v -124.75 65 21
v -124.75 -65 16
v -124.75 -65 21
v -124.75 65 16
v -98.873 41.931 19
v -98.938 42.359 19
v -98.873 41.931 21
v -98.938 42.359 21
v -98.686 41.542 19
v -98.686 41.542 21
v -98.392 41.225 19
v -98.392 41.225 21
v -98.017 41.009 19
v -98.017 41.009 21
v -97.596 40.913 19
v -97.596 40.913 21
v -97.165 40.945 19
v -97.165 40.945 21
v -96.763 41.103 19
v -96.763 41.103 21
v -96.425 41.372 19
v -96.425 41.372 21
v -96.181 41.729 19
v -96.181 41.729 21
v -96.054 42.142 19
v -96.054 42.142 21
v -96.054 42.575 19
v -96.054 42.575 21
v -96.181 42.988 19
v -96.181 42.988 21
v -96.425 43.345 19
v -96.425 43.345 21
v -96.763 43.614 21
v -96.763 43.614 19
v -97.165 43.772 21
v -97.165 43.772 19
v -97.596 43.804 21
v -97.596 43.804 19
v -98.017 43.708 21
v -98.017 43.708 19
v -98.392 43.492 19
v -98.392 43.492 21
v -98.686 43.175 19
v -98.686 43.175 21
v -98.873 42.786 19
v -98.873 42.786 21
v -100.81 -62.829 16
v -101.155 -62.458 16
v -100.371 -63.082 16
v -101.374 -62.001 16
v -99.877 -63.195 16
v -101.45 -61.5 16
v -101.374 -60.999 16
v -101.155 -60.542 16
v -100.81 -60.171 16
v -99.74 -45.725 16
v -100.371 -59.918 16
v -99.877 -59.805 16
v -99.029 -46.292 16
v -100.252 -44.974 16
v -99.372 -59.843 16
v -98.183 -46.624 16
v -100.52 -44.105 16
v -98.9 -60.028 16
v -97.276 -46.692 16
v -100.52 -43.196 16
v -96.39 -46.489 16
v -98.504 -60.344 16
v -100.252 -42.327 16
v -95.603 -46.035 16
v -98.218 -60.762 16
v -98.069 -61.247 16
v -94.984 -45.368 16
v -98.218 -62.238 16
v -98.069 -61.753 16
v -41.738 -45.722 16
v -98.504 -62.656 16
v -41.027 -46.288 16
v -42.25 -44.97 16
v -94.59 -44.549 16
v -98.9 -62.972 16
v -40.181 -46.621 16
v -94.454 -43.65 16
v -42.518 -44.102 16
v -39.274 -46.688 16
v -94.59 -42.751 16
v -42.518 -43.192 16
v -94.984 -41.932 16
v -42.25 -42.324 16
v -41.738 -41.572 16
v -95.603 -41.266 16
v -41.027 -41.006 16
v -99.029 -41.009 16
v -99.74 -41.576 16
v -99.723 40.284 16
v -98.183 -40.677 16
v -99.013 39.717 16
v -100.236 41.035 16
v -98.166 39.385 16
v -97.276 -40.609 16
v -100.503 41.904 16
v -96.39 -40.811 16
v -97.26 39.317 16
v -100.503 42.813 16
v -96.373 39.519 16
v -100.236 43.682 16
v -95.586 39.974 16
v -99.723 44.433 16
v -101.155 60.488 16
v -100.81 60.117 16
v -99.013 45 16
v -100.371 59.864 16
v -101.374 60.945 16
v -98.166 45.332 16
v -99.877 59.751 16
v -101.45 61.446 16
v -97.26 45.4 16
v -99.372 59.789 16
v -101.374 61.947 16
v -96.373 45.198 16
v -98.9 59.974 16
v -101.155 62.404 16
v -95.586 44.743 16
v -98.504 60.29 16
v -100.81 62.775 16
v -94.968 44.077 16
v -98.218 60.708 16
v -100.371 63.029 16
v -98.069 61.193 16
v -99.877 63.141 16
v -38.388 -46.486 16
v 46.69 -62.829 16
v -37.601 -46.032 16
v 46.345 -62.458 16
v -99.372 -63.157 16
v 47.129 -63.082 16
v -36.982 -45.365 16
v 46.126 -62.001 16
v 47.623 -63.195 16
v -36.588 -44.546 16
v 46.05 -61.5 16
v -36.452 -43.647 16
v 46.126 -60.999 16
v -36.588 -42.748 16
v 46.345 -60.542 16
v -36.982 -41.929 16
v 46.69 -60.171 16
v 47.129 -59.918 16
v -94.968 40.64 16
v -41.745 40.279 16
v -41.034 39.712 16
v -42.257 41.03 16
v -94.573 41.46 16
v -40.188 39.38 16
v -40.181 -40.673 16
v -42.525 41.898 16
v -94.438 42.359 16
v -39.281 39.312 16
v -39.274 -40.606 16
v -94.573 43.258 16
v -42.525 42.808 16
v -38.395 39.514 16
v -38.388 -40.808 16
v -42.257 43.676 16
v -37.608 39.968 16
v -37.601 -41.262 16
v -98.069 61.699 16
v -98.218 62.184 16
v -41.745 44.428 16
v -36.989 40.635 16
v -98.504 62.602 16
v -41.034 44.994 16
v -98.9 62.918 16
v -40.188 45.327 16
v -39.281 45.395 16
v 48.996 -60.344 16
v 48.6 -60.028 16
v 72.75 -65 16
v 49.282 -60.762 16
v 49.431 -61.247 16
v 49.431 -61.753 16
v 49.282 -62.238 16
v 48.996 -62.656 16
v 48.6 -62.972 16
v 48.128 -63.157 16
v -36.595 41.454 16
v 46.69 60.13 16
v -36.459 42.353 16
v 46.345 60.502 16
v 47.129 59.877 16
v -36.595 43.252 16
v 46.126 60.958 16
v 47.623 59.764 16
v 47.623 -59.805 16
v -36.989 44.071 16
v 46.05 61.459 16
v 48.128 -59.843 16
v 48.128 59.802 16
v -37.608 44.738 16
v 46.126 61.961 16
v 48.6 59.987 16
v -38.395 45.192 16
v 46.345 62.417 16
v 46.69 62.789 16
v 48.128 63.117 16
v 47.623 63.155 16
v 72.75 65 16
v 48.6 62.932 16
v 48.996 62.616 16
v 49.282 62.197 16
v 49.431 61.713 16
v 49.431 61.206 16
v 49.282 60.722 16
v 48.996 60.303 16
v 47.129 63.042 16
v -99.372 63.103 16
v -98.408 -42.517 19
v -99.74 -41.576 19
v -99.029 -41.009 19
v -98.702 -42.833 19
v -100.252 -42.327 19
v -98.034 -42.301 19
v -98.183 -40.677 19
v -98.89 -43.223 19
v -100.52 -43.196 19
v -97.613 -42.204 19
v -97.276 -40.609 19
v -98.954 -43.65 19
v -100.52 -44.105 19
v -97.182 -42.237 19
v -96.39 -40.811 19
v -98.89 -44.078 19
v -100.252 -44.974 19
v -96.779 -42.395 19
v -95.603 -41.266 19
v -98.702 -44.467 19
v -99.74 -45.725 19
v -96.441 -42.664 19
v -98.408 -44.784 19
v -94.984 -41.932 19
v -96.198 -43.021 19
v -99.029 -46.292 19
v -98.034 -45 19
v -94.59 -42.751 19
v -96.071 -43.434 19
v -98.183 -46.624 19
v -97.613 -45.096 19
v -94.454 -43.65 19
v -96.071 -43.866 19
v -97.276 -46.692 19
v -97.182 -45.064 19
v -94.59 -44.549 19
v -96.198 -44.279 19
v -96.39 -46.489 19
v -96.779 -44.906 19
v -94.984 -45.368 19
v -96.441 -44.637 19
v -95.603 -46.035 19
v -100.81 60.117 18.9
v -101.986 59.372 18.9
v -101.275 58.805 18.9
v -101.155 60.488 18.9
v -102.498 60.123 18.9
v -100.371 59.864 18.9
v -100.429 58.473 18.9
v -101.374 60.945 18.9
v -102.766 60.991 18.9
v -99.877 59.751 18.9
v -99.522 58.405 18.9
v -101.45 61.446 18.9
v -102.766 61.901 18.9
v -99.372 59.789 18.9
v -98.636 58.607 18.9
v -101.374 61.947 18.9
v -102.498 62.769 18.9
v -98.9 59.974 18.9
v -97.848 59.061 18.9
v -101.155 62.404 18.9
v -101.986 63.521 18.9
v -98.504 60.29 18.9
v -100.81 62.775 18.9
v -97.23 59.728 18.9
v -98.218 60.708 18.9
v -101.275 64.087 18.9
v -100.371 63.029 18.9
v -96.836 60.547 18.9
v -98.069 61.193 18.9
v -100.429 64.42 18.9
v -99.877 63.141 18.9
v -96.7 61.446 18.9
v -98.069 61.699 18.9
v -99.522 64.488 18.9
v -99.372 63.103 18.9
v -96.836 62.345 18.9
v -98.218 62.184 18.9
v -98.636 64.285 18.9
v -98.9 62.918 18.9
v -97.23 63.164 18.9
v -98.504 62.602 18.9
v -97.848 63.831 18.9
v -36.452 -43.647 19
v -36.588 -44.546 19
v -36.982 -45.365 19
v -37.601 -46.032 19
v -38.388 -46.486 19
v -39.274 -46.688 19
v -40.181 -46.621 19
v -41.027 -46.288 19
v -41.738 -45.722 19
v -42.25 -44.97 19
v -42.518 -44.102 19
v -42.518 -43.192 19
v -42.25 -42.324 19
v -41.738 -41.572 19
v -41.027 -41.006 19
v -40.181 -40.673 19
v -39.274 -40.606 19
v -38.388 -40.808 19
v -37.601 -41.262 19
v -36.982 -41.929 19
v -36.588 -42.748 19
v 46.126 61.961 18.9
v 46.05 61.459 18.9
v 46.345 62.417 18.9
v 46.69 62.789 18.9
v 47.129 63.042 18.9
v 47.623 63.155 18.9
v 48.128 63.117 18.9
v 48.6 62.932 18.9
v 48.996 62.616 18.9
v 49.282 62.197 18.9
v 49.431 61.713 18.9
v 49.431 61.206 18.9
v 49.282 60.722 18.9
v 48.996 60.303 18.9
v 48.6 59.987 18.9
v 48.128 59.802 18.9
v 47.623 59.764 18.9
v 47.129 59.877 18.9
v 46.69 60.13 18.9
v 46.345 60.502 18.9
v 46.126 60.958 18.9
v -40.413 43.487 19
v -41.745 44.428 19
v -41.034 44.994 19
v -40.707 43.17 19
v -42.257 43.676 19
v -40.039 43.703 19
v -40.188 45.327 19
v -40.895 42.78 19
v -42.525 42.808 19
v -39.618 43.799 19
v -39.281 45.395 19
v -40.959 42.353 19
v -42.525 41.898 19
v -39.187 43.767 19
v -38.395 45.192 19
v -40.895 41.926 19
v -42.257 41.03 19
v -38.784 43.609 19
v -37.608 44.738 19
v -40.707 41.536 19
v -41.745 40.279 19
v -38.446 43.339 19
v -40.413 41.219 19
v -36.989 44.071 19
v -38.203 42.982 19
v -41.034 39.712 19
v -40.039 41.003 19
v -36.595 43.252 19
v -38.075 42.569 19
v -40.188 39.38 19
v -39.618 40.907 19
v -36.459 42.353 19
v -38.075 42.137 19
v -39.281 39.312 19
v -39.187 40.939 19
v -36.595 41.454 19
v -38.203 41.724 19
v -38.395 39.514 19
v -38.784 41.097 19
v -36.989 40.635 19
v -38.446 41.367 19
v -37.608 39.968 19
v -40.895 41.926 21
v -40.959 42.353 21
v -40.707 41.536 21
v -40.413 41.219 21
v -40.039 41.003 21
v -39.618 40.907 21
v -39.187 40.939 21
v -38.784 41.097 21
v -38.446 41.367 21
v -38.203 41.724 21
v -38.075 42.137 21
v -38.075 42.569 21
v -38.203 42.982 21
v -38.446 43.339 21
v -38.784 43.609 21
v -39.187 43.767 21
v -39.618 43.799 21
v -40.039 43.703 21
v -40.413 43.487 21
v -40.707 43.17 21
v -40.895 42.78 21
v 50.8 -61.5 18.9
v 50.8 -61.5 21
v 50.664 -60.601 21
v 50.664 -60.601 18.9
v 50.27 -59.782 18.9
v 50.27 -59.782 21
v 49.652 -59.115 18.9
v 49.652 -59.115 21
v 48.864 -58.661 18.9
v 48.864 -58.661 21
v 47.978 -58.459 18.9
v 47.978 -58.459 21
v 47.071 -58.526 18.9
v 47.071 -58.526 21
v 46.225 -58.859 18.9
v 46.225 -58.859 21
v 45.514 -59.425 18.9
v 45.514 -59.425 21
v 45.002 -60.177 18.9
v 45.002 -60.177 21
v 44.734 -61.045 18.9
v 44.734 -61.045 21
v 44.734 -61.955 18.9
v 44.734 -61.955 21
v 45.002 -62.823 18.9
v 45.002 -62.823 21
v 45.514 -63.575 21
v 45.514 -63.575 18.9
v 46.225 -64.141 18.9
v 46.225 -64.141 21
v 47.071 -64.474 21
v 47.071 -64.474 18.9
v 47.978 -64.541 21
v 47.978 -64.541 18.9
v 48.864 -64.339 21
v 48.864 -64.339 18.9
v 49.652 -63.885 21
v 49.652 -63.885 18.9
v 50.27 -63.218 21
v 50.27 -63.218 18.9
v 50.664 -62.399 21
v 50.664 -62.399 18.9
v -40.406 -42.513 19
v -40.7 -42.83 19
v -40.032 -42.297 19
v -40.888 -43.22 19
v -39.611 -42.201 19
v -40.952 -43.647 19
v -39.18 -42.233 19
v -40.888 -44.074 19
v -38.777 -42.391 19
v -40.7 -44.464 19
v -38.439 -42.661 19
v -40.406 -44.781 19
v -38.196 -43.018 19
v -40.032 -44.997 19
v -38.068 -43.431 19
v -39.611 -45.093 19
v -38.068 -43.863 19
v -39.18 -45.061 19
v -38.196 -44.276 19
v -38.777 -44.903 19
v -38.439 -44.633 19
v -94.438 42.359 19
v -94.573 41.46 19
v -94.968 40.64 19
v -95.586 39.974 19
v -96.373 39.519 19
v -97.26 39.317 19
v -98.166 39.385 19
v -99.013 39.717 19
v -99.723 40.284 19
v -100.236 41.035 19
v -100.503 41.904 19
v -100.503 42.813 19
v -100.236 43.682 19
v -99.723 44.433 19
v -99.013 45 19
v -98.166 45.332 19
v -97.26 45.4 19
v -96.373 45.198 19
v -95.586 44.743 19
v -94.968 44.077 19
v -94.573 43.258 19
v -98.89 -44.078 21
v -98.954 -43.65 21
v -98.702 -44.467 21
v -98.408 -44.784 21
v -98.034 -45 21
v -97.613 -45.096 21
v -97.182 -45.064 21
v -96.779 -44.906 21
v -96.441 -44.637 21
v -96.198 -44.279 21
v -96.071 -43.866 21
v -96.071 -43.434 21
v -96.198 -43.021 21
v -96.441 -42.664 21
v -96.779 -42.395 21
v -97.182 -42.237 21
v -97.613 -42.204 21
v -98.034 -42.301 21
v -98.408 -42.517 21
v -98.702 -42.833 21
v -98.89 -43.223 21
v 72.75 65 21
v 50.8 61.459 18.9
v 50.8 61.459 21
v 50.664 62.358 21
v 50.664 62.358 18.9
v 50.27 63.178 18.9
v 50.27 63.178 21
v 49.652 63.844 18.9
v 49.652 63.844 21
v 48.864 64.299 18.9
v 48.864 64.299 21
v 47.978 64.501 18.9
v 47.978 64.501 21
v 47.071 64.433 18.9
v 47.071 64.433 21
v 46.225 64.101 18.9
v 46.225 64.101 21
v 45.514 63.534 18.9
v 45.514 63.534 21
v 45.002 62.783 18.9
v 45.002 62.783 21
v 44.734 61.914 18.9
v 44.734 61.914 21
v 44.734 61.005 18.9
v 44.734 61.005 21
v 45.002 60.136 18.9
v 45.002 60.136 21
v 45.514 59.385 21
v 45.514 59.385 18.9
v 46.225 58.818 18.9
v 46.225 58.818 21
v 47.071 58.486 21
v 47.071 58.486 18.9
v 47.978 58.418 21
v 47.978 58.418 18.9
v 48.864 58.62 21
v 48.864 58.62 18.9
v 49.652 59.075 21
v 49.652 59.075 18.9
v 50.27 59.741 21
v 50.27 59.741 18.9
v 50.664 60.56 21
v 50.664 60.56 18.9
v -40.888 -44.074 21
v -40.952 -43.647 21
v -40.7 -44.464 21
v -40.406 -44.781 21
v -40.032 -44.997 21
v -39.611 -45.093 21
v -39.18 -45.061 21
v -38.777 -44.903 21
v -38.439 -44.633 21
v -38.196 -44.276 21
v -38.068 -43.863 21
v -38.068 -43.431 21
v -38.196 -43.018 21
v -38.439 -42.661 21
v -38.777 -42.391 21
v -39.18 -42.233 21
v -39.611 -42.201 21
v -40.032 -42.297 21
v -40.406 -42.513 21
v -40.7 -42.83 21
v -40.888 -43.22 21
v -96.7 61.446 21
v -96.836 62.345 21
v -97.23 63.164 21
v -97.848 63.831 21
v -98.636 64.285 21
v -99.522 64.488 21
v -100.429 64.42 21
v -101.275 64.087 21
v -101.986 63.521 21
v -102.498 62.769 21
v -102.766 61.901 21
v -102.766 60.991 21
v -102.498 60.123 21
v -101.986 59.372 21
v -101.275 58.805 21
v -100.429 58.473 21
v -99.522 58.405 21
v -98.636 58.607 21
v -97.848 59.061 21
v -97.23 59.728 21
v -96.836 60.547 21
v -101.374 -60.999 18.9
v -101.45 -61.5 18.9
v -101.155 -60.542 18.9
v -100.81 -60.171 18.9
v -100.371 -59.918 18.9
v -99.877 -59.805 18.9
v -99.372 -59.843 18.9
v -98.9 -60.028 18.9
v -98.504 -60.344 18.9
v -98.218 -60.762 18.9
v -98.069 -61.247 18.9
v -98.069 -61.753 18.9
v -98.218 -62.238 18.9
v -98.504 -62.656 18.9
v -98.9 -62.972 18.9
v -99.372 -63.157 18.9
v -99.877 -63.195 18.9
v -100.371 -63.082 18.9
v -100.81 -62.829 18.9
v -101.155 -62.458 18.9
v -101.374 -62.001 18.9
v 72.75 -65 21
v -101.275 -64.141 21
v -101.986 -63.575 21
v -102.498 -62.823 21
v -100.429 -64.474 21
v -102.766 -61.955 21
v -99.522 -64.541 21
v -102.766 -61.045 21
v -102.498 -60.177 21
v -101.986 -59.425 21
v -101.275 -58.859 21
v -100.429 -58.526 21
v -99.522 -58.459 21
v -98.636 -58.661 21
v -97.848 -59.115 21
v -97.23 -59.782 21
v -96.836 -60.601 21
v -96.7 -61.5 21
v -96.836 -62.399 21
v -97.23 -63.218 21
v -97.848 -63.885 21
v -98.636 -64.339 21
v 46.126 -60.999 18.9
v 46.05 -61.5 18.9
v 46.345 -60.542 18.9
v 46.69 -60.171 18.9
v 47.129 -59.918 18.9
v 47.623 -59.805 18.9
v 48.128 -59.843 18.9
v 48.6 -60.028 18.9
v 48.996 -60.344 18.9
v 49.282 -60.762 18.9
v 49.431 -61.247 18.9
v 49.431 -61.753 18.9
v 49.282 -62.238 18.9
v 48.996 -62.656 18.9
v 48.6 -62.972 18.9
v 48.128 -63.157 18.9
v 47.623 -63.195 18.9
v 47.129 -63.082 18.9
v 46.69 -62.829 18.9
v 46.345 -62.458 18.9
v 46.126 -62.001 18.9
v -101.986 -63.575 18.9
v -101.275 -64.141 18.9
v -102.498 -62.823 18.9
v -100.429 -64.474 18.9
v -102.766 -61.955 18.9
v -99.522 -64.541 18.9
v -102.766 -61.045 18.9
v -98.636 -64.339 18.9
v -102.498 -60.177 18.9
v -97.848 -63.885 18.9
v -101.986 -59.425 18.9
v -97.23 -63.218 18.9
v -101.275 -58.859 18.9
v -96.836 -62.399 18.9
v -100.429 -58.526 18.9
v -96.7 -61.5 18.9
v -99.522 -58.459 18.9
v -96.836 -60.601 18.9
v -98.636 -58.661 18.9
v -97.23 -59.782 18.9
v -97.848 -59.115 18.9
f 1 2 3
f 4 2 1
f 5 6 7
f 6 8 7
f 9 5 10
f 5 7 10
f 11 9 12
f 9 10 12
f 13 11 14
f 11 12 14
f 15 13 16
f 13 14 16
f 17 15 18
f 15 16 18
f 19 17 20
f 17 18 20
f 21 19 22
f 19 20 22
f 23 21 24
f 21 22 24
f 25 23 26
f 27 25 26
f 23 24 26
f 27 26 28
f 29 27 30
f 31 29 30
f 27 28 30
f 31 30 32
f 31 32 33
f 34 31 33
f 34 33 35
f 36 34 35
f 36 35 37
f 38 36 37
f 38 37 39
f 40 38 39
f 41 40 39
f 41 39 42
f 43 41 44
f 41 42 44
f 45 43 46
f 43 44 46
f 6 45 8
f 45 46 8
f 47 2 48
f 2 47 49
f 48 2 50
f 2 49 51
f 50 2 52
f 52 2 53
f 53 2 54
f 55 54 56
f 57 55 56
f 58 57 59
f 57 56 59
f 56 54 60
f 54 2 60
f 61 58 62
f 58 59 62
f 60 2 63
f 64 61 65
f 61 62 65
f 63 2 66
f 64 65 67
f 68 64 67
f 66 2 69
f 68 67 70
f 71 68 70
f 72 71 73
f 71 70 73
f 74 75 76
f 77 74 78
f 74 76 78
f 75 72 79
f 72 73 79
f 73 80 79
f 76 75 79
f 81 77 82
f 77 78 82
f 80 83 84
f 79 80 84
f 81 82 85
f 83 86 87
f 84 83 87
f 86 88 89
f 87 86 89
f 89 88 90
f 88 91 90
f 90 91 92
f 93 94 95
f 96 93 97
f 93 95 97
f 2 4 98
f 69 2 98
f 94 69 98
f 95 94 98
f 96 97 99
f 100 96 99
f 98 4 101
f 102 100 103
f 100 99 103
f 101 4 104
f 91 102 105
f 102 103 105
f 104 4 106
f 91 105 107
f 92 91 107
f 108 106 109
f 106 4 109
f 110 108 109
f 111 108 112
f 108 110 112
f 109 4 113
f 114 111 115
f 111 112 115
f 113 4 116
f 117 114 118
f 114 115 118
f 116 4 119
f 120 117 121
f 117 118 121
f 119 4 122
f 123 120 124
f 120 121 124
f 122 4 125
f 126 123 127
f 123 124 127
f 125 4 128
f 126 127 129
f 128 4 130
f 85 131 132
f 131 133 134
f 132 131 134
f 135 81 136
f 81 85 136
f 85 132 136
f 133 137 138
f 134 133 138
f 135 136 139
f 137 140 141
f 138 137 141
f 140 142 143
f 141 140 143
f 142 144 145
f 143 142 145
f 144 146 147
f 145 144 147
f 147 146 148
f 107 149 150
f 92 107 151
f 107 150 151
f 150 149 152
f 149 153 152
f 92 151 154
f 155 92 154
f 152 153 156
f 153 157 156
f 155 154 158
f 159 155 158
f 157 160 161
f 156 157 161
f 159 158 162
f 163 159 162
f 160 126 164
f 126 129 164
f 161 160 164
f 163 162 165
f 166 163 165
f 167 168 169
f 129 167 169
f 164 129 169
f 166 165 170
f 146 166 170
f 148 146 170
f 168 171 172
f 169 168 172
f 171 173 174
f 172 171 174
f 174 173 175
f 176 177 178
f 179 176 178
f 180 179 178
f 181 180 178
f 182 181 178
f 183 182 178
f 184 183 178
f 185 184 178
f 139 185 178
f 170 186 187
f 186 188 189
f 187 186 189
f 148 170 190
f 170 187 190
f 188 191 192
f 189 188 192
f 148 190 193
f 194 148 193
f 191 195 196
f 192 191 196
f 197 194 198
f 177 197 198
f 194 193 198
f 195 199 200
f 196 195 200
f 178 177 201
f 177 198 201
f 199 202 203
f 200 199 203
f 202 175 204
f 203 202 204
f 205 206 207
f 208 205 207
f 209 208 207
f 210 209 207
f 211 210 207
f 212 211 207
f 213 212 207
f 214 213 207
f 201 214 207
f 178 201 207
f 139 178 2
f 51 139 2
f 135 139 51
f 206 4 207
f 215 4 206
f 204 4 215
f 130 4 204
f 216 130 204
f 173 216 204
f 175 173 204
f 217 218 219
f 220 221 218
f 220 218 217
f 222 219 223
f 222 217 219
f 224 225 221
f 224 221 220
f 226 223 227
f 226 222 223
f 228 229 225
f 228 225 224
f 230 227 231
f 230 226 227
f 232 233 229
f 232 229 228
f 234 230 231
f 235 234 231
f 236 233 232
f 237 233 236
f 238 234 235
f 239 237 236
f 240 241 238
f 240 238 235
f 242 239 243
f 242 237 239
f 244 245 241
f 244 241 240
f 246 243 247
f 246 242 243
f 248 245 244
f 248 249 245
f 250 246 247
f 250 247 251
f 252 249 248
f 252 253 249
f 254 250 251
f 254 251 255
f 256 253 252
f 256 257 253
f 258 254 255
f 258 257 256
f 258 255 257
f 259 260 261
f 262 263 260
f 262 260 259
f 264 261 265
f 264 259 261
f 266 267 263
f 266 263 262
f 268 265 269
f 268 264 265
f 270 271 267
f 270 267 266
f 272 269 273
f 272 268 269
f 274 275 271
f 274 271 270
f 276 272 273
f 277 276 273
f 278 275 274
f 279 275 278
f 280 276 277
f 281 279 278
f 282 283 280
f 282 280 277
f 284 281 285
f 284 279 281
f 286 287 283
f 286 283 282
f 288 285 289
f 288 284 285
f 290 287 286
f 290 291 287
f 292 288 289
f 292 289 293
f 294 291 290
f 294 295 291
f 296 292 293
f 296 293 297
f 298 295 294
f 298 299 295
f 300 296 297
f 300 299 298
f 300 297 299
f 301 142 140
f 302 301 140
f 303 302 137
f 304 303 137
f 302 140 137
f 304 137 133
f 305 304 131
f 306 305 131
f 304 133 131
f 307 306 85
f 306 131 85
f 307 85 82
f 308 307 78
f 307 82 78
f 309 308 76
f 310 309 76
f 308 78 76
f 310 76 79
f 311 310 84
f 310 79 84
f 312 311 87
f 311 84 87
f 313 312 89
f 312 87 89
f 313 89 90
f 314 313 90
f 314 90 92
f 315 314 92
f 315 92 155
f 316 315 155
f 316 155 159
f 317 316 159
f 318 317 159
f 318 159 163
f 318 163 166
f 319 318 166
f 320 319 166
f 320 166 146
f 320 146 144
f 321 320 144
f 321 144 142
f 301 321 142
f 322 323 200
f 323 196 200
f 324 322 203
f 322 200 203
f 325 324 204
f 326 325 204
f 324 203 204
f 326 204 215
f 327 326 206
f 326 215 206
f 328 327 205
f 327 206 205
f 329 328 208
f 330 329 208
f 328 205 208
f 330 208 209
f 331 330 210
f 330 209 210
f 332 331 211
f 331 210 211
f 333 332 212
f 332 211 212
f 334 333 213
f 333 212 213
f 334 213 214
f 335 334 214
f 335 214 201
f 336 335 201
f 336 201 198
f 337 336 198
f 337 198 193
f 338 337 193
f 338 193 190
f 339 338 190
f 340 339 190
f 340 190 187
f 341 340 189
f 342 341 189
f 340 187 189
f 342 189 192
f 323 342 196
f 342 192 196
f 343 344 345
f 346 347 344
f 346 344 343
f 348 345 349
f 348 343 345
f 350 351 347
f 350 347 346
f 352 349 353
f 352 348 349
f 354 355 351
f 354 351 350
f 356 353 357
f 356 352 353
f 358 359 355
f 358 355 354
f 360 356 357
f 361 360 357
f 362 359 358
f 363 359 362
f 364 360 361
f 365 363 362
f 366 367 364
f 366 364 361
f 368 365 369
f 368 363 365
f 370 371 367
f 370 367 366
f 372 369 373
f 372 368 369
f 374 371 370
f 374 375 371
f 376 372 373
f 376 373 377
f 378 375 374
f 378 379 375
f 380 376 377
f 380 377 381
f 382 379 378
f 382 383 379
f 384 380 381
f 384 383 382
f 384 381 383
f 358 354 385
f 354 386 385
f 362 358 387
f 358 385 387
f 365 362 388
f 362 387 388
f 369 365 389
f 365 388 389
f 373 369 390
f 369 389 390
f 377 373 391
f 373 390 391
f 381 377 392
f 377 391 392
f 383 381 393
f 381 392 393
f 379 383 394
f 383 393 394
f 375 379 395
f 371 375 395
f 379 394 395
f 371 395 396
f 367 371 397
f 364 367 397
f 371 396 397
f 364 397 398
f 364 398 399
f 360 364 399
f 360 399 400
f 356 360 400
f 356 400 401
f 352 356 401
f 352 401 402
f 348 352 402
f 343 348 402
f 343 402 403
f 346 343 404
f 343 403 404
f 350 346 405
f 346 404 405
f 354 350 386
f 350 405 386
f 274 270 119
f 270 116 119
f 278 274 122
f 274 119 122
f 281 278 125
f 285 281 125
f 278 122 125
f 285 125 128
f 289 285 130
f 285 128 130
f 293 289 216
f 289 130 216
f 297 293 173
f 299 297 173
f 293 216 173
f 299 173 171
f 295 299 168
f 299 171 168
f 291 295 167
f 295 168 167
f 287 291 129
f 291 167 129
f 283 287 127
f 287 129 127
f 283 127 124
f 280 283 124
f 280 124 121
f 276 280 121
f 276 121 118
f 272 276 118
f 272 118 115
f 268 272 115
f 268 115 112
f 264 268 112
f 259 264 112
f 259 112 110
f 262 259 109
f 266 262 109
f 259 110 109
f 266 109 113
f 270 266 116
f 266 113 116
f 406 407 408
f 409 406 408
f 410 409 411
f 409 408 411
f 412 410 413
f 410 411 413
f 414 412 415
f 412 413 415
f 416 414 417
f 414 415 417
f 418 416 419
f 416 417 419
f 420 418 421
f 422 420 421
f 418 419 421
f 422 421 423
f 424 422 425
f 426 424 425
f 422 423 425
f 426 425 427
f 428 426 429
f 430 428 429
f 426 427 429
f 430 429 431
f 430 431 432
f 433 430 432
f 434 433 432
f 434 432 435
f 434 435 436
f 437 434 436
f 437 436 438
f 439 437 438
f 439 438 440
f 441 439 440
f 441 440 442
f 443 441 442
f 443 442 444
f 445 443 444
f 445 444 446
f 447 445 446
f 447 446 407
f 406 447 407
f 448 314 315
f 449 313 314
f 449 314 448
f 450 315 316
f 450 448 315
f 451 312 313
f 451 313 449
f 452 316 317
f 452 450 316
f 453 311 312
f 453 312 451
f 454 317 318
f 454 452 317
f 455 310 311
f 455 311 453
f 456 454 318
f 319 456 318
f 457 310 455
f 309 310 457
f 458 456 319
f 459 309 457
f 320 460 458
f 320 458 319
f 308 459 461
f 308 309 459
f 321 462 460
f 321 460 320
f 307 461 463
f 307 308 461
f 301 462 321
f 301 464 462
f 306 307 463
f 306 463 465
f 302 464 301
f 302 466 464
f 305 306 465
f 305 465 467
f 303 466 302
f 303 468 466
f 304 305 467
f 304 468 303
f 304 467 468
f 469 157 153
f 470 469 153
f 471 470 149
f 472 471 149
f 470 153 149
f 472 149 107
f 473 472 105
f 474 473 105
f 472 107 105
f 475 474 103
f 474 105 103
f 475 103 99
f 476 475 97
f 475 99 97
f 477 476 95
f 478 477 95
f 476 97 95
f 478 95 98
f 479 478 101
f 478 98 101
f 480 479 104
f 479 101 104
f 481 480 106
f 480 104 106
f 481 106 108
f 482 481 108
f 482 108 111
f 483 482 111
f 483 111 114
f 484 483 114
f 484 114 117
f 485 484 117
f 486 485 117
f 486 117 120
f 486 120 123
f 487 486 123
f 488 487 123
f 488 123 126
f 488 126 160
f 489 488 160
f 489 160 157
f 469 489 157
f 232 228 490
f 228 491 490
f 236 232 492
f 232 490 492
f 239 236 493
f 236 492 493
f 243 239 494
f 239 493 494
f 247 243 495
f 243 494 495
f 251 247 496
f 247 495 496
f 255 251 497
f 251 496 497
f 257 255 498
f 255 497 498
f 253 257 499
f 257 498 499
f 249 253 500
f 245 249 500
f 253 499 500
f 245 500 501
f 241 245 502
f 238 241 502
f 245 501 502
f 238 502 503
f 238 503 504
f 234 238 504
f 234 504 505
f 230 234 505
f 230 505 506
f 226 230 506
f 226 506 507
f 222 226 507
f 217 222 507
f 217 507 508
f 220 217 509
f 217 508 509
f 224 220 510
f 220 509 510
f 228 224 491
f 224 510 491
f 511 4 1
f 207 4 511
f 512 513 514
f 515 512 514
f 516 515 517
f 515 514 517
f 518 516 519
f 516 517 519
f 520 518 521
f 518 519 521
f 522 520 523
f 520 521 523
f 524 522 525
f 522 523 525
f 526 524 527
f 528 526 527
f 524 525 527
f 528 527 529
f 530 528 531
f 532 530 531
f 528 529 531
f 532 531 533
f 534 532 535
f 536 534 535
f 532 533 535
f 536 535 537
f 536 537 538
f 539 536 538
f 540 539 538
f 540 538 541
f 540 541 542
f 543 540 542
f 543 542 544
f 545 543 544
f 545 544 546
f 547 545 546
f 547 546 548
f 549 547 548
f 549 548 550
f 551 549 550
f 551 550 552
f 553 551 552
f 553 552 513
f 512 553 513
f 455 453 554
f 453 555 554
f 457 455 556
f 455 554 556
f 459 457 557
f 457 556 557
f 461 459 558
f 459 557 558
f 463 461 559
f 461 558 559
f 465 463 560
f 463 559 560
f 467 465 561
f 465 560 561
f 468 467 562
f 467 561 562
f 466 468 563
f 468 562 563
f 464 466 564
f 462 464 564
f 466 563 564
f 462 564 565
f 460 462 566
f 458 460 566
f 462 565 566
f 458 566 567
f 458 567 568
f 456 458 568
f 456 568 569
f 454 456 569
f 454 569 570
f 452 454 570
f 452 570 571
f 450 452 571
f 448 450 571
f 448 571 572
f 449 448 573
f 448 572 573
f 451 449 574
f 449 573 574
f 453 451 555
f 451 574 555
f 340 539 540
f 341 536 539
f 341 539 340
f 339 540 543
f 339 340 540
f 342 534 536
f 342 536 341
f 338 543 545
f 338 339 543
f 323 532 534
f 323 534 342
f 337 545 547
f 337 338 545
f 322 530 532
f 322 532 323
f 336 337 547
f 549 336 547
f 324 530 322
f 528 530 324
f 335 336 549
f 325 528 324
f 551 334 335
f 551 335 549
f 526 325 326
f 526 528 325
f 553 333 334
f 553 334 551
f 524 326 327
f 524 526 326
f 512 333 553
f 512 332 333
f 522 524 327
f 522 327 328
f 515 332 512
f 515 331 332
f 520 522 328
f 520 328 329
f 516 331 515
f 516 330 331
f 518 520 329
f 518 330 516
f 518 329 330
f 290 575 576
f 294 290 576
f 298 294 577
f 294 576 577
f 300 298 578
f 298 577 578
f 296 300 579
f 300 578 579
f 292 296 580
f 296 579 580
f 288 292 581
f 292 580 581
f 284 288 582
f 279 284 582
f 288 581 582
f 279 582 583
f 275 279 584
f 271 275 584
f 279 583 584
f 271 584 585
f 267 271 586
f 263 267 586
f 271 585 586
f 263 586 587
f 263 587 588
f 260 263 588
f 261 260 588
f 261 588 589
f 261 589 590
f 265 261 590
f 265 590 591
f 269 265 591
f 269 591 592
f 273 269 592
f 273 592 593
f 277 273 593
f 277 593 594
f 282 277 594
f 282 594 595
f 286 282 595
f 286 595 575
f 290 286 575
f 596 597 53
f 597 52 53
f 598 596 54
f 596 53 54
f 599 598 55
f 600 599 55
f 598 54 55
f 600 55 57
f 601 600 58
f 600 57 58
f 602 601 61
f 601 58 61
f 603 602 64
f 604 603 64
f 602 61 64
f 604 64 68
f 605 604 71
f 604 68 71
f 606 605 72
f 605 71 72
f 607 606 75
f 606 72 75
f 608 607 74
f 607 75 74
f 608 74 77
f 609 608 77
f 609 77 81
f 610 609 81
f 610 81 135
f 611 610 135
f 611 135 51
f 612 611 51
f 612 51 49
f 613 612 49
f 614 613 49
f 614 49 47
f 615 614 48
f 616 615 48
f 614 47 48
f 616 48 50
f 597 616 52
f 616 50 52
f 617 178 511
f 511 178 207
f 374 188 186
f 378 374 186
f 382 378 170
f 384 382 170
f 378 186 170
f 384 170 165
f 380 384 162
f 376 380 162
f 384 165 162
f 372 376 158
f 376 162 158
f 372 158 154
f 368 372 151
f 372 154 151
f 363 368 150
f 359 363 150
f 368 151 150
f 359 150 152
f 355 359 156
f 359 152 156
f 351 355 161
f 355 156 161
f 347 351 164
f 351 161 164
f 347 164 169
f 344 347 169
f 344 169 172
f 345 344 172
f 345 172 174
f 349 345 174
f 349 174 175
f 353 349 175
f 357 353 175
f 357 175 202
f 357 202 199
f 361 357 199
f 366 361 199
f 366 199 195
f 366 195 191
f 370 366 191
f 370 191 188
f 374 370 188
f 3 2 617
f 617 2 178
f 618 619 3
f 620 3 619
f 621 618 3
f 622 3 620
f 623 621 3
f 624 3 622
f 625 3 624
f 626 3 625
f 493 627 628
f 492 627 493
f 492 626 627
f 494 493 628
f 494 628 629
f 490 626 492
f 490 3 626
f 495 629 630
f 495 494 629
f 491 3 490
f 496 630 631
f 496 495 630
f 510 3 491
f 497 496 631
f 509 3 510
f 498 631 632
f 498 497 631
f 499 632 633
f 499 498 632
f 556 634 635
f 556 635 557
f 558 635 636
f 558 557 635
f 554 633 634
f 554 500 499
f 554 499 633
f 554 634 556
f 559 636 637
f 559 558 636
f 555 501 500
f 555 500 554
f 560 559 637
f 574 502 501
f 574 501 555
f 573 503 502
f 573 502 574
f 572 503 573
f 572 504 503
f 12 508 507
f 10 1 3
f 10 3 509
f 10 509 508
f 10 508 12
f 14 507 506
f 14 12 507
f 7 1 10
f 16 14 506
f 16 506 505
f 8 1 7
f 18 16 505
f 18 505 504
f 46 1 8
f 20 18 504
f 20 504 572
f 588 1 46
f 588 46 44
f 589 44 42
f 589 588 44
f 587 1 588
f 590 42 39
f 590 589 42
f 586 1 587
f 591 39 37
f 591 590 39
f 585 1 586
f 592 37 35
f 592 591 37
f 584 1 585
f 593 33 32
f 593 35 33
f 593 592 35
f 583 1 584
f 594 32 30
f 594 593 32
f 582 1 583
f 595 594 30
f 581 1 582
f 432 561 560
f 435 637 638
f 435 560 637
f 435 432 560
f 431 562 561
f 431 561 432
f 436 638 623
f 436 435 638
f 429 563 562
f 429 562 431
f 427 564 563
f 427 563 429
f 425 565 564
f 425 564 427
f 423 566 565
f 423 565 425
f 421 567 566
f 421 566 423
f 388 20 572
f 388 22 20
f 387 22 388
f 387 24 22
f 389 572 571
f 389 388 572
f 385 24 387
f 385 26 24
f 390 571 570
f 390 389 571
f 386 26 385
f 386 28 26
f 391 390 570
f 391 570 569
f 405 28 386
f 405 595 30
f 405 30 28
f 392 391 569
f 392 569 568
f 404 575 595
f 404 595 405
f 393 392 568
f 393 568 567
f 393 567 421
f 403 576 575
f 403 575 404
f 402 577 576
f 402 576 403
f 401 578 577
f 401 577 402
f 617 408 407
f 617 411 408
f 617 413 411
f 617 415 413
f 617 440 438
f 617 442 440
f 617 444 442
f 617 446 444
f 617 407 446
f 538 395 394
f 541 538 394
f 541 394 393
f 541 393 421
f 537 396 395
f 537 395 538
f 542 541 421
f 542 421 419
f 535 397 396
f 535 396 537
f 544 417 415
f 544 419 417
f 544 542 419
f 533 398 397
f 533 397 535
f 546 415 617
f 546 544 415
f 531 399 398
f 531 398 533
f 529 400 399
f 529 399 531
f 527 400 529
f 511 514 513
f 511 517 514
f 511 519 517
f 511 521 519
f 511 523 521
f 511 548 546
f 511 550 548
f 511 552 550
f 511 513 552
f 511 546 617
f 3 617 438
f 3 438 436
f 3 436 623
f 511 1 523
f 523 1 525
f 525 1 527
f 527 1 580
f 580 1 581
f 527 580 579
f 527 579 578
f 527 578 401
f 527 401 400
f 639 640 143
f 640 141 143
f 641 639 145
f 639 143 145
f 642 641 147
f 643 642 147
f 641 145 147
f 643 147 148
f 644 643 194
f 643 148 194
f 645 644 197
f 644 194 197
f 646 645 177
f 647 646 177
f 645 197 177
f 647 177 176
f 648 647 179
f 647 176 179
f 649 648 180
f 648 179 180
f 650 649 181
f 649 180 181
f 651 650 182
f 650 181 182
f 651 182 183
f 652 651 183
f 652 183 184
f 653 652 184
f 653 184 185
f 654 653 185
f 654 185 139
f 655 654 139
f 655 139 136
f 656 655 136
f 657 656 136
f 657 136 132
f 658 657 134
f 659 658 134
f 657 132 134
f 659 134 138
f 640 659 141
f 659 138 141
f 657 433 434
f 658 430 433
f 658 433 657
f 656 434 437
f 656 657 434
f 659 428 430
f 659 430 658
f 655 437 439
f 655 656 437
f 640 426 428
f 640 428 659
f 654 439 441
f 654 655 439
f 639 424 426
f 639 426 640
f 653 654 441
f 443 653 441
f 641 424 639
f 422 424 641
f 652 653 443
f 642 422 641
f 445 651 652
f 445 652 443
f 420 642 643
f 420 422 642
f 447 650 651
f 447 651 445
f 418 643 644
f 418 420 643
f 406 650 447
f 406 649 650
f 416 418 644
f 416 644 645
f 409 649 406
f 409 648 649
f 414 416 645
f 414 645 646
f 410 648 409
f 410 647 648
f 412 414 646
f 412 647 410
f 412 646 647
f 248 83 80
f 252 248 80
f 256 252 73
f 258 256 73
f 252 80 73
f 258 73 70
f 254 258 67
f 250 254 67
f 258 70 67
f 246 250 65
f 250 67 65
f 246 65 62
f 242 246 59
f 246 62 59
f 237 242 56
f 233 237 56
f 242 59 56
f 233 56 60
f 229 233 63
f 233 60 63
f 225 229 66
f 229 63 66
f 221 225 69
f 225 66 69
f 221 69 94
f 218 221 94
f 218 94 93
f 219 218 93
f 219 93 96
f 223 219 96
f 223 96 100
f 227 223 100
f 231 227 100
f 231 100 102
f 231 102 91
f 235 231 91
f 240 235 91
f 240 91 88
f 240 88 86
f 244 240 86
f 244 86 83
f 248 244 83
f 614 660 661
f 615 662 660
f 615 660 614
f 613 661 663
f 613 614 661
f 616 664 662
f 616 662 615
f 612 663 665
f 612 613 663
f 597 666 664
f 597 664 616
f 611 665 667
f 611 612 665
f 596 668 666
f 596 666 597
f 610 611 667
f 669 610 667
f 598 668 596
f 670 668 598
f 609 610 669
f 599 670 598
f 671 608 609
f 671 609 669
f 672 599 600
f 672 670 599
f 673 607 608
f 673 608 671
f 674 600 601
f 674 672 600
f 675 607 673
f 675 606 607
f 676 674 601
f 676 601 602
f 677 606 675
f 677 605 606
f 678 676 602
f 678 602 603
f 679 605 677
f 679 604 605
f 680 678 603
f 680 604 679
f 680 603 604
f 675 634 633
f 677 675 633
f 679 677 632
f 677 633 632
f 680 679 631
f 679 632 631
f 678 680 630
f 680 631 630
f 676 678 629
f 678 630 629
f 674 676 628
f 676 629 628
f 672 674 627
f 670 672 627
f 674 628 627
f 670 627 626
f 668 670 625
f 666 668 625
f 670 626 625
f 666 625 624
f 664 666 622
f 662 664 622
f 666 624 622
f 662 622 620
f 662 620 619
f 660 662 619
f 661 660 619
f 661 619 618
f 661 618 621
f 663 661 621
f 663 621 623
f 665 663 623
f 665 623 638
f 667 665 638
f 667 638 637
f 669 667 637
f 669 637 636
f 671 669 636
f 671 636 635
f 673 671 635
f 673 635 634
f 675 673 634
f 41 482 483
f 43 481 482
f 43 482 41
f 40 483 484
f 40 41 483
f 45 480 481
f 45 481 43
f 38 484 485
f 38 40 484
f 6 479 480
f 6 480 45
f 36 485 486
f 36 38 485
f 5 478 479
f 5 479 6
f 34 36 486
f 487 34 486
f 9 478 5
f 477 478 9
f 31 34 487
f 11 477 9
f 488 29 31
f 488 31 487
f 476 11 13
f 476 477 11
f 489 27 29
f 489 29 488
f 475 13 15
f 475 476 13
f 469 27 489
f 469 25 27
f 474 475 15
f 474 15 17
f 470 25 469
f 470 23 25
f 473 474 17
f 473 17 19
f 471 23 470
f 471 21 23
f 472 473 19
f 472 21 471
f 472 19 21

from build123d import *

# Parameters (mm, degrees)
SKETCH025_W         = 197.5
SKETCH025_H         = 130
PAD019_DEPTH        = 5
HOLE001_D           = 3.4
HOLE001_DEPTH       = 25
HOLE001_CBORE_D     = 6.1
HOLE001_CBORE_DEPTH = 2.1
HOLE002_D           = 2.9
HOLE002_DEPTH       = 25
HOLE002_CBORE_D     = 6.1
HOLE002_CBORE_DEPTH = 3


with BuildPart() as part:
    # Sketch025 → Pad019 (new body)
    with BuildSketch(Plane.XY):
        Rectangle(SKETCH025_W, SKETCH025_H)
    extrude(amount=PAD019_DEPTH)

    # Hole001
    with Locations(Plane.XY.offset(5)):
        with Locations((73.75, 61.459462), (-73.75, 61.446044), (-73.75, -61.5), (73.75, -61.5)):
            CounterBoreHole(HOLE001_D / 2, HOLE001_CBORE_D / 2, HOLE001_CBORE_DEPTH, depth=HOLE001_DEPTH)

    # Hole002
    with Locations(Plane(origin=(0, 0, 0), x_dir=(1, 0, 0), z_dir=(0, 0, -1))):
        with Locations((-13.502274, 43.646988), (-71.504372, 43.650288), (-13.509218, -42.353077), (-71.487556, -42.358528)):
            CounterBoreHole(HOLE002_D / 2, HOLE002_CBORE_D / 2, HOLE002_CBORE_DEPTH, depth=HOLE002_DEPTH)


with BuildPart() as part_1:
    # Body004 placement: moved
    add(part.part.moved(Location((-26, 0, 16))))


solid = part_1.part
